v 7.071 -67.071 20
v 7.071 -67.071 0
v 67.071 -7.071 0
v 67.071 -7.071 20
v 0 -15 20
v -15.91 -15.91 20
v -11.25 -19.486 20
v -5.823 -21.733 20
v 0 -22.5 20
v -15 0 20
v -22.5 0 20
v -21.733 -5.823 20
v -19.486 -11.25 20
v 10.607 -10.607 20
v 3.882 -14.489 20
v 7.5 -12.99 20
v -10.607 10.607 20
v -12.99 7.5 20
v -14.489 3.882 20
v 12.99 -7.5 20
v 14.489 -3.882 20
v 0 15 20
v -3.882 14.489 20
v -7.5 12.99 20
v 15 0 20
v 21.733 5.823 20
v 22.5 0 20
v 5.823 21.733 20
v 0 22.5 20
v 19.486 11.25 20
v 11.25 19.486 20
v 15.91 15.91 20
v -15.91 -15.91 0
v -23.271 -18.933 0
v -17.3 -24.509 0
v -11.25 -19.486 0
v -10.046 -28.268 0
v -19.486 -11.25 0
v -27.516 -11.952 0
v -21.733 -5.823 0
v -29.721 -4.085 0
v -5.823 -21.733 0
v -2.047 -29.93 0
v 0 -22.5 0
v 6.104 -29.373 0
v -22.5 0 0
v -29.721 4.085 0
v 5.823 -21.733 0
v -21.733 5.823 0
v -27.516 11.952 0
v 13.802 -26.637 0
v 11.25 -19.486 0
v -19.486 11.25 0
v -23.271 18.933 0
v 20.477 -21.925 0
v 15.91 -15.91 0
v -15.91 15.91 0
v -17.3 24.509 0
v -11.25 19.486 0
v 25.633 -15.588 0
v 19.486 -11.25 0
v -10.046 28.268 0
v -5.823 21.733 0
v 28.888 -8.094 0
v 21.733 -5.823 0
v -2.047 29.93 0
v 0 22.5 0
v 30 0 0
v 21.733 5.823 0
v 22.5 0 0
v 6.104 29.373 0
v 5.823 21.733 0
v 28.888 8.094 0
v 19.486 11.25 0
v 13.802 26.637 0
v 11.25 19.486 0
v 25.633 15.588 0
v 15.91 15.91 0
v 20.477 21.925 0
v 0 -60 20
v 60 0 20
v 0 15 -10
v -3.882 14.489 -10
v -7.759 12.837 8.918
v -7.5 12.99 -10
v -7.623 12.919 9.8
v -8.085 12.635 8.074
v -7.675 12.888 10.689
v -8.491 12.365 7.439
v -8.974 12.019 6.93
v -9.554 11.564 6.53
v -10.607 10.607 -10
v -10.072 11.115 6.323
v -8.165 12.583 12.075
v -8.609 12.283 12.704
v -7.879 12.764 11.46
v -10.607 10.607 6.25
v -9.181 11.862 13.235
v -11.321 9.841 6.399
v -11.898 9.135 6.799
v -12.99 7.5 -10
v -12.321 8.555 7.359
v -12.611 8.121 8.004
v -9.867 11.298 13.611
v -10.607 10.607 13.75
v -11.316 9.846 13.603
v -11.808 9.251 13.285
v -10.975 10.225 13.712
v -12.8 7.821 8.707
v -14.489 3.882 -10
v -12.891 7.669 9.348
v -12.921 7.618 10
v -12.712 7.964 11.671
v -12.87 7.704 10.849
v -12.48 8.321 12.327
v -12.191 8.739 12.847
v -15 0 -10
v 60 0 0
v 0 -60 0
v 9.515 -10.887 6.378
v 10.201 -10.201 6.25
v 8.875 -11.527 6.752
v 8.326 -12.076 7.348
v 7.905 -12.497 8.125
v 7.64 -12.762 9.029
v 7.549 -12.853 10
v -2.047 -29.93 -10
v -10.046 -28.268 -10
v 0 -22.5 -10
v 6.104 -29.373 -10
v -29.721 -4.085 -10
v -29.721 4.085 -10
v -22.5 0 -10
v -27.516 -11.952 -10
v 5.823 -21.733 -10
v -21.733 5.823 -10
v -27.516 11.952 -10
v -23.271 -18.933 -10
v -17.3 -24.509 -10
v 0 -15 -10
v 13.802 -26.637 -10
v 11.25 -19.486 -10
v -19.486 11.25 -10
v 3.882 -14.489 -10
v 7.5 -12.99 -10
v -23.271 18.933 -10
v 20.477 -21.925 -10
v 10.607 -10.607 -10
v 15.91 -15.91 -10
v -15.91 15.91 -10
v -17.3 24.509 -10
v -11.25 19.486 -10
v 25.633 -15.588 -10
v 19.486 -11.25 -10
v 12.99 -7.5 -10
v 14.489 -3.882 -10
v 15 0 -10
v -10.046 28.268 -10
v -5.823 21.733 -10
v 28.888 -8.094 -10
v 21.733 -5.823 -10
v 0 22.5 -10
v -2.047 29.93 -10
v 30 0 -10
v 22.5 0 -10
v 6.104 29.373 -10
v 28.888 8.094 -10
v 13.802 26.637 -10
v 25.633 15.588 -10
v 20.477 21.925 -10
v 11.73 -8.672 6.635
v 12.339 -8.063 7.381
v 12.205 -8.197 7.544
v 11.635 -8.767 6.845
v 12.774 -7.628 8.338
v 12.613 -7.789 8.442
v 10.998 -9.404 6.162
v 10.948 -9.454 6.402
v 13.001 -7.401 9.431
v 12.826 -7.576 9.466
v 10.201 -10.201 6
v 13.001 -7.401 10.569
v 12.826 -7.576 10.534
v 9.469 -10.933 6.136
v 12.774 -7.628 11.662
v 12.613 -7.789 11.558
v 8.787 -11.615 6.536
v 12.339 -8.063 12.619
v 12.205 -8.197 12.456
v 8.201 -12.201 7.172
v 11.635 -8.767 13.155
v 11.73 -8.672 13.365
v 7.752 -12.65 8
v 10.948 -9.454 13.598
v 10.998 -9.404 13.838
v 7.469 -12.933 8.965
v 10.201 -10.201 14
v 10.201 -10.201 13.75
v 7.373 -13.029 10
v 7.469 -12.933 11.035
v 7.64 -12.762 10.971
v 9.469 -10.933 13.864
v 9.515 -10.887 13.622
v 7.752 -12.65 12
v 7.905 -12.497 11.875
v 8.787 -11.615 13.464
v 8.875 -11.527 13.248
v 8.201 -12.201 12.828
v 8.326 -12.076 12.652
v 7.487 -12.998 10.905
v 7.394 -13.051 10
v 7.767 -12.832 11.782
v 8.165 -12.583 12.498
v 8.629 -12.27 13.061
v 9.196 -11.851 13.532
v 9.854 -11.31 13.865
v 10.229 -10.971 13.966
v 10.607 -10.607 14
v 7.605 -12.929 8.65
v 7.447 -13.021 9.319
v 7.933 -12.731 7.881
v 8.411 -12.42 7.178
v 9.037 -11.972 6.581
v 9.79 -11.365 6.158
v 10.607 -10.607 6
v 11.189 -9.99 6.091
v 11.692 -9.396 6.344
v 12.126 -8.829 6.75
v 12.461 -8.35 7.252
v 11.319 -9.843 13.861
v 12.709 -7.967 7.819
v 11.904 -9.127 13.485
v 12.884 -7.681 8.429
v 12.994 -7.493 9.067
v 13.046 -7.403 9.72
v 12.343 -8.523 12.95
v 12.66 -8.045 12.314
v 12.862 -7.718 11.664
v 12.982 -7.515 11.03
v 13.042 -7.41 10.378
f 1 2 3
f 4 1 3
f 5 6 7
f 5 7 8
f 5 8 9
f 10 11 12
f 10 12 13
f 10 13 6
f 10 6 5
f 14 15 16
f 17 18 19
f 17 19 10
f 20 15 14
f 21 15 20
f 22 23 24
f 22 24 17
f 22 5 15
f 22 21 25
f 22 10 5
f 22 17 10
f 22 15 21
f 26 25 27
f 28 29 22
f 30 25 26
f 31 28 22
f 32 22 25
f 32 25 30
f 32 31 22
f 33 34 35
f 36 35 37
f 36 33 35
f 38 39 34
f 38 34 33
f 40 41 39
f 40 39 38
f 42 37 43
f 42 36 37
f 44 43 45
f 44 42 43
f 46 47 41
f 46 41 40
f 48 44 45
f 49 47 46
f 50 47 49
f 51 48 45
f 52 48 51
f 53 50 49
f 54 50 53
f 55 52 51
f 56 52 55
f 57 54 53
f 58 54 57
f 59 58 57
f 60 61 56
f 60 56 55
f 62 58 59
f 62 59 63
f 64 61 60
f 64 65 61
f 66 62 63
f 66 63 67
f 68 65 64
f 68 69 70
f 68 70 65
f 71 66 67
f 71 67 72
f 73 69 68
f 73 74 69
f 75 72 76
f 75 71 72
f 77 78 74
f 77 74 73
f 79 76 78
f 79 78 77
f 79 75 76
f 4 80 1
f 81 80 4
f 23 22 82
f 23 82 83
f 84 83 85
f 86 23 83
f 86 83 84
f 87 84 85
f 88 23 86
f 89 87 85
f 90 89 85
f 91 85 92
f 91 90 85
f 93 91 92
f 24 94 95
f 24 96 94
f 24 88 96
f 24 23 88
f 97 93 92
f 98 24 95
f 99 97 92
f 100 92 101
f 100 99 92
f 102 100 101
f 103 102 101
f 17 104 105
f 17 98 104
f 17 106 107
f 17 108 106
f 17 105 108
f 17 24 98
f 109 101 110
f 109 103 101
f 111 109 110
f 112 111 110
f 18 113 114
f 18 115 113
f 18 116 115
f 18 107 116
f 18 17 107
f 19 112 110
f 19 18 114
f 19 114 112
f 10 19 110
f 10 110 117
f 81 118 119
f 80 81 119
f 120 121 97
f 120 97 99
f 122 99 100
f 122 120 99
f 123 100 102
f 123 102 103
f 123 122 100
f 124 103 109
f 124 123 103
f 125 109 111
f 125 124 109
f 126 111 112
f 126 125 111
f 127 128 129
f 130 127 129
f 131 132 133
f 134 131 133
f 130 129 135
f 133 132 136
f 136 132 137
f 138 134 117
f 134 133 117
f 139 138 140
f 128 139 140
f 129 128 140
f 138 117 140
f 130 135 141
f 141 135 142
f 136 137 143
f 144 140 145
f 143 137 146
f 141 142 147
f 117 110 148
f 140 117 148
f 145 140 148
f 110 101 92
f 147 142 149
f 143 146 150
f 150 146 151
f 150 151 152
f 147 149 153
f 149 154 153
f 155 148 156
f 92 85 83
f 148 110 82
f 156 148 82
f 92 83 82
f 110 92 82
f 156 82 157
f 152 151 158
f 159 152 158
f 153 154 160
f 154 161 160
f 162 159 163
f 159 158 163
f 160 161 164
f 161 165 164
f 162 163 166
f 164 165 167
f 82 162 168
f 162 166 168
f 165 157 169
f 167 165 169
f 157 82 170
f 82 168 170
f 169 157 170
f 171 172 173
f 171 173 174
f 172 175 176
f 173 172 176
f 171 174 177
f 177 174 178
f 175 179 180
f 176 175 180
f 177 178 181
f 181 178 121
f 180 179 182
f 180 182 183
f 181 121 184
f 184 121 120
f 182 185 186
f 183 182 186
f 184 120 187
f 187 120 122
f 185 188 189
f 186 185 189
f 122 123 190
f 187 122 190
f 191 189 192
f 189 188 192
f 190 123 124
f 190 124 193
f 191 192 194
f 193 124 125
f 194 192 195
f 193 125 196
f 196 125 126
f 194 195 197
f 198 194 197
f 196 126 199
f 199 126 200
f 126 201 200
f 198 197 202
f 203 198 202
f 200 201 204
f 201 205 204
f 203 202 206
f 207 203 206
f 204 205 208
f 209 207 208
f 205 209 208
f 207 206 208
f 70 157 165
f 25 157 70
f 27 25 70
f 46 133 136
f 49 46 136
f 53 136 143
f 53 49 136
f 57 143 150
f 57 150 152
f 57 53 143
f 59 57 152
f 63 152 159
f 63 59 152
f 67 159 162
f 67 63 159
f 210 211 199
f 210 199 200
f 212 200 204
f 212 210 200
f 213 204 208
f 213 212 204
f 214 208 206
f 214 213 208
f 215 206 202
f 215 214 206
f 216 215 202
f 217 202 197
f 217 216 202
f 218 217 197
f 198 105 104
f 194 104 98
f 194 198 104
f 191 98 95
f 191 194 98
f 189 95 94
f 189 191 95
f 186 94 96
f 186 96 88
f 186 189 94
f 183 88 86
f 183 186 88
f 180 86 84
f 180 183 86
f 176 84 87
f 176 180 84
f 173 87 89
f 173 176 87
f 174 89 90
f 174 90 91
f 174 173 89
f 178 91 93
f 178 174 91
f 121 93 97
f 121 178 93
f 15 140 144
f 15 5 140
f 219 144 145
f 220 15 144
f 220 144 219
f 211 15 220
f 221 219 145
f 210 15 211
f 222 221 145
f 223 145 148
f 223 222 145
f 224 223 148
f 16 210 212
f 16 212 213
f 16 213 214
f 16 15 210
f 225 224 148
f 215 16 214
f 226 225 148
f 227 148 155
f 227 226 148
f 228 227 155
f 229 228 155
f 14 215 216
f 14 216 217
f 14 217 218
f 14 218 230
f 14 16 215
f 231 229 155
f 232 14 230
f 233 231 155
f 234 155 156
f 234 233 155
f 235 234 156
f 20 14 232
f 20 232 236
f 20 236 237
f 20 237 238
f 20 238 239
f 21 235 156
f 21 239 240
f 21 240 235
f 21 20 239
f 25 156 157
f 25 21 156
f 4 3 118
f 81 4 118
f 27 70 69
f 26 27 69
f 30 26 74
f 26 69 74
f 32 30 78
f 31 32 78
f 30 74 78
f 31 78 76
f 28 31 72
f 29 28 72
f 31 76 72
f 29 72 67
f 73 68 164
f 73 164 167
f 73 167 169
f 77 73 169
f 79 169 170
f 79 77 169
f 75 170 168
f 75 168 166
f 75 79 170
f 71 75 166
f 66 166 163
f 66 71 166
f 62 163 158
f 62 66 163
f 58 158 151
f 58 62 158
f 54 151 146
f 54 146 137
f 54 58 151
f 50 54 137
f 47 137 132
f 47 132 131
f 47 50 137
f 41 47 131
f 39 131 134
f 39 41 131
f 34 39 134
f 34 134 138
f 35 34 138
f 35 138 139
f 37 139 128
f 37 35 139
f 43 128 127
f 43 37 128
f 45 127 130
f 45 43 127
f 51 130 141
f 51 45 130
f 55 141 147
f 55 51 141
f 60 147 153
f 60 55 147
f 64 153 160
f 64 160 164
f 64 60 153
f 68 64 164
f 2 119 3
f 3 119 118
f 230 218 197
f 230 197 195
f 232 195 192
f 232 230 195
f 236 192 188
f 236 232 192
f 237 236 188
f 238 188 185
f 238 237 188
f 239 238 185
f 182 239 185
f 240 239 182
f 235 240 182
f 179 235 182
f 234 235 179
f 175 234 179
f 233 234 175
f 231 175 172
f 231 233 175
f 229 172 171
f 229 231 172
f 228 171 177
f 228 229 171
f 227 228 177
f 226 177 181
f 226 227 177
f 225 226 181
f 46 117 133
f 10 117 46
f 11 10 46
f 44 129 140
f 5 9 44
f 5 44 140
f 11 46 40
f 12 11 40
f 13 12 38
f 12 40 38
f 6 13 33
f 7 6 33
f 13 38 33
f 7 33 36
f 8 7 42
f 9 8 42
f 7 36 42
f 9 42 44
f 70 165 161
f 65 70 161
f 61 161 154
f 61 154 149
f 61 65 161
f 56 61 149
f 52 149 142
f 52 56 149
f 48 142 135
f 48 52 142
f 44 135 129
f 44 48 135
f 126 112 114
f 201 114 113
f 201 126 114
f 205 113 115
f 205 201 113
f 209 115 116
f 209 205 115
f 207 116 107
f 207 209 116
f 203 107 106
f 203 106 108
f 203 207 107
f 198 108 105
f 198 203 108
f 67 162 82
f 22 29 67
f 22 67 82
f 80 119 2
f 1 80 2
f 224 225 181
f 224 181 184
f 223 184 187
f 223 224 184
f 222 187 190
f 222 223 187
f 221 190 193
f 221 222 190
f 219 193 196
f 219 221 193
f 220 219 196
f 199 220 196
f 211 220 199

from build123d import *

# Parameters (mm, degrees)
F1_DEPTH = 20
F0_R     = 30
F2_DEPTH = 10
F4_DEPTH = 20
F6_DEPTH = 60
F7_DEPTH = 28


with BuildPart() as f1:
    # F0 (on Top) → F1 (new body)
    with BuildSketch(Plane.XY):
        with BuildLine():
            ThreePointArc((0, -15), (10.6066017178, -10.6066017178), (15, 0))
            ThreePointArc((15, 0), (10.6066017178, 10.6066017178), (0, 15))
            ThreePointArc((0, 15), (-10.6066017178, 10.6066017178), (-15, 0))
            ThreePointArc((-15, 0), (-10.6066017178, -10.6066017178), (0, -15))
        make_face()
        with BuildLine():
            ThreePointArc((0, 15), (10.6066017178, 10.6066017178), (15, 0))
            Line((15, 0), (22.5, 0))
            ThreePointArc((22.5, 0), (15.9099025767, 15.9099025767), (0, 22.5))
            Line((0, 22.5), (0, 15))
        make_face()
        with BuildLine():
            Line((0, -22.5), (0, -15))
            ThreePointArc((0, -15), (-10.6066017178, -10.6066017178), (-15, 0))
            Line((-15, 0), (-22.5, 0))
            ThreePointArc((-22.5, 0), (-15.9099025767, -15.9099025767), (0, -22.5))
        make_face()
    extrude(amount=F1_DEPTH)

    # F0 (on Top) → F2 (join)
    with BuildSketch(Plane.XY):
        Circle(F0_R)
        with BuildLine():
            ThreePointArc((0, 22.5), (15.9099025767, 15.9099025767), (22.5, 0))
            ThreePointArc((22.5, 0), (15.9099025767, -15.9099025767), (0, -22.5))
            ThreePointArc((0, -22.5), (-15.9099025767, -15.9099025767), (-22.5, 0))
            ThreePointArc((-22.5, 0), (-15.9099025767, 15.9099025767), (0, 22.5))
        make_face(mode=Mode.SUBTRACT)
        with BuildLine():
            ThreePointArc((0, 15), (10.6066017178, 10.6066017178), (15, 0))
            Line((15, 0), (22.5, 0))
            ThreePointArc((22.5, 0), (15.9099025767, 15.9099025767), (0, 22.5))
            Line((0, 22.5), (0, 15))
        make_face()
        with BuildLine():
            ThreePointArc((0, -15), (10.6066017178, -10.6066017178), (15, 0))
            ThreePointArc((15, 0), (10.6066017178, 10.6066017178), (0, 15))
            ThreePointArc((0, 15), (-10.6066017178, 10.6066017178), (-15, 0))
            ThreePointArc((-15, 0), (-10.6066017178, -10.6066017178), (0, -15))
        make_face()
        with BuildLine():
            Line((0, -22.5), (0, -15))
            ThreePointArc((0, -15), (-10.6066017178, -10.6066017178), (-15, 0))
            Line((-15, 0), (-22.5, 0))
            ThreePointArc((-22.5, 0), (-15.9099025767, -15.9099025767), (0, -22.5))
        make_face()
    extrude(amount=-F2_DEPTH)

    # F5 (on face) → F6 (cut)
    with BuildSketch(Plane(origin=(30, -30, 0), x_dir=(-0.7071067812, -0.7071067812, 0), z_dir=(-0.7071067812, 0.7071067812, 0))):
        with BuildLine():
            Line((0, 6.25), (0, 13.75))
            ThreePointArc((0, 13.75), (-3.75, 10), (0, 6.25))
        make_face()
        with BuildLine():
            ThreePointArc((3.75, 10), (2.6516504294, 12.6516504294), (0, 13.75))
            Line((0, 13.75), (0, 6.25))
            ThreePointArc((0, 6.25), (2.6516504294, 7.3483495706), (3.75, 10))
        make_face()
    extrude(amount=F6_DEPTH, mode=Mode.SUBTRACT)

    # F5 (on face) → F7 (cut)
    with BuildSketch(Plane(origin=(30, -30, 0), x_dir=(-0.7071067812, -0.7071067812, 0), z_dir=(-0.7071067812, 0.7071067812, 0))):
        with BuildLine():
            Line((0, 13.75), (0, 14))
            ThreePointArc((0, 14), (-4, 10), (0, 6))
            Line((0, 6), (0, 6.25))
            ThreePointArc((0, 6.25), (-3.75, 10), (0, 13.75))
        make_face()
        with BuildLine():
            ThreePointArc((4, 10), (2.8284271247, 12.8284271247), (0, 14))
            Line((0, 14), (0, 13.75))
            ThreePointArc((0, 13.75), (2.6516504294, 12.6516504294), (3.75, 10))
            ThreePointArc((3.75, 10), (2.6516504294, 7.3483495706), (0, 6.25))
            Line((0, 6.25), (0, 6))
            ThreePointArc((0, 6), (2.8284271247, 7.1715728753), (4, 10))
        make_face()
    extrude(amount=F7_DEPTH, mode=Mode.SUBTRACT)


with BuildPart() as f4:
    # F3 (on Top) → F4 (new body)
    with BuildSketch(Plane.XY):
        Polygon((67.0710678119, -7.0710678119), (60, 0), (0, -60), (7.0710678119, -67.0710678119), align=None)
    extrude(amount=F4_DEPTH)


solid = Compound([f1.part, f4.part])
